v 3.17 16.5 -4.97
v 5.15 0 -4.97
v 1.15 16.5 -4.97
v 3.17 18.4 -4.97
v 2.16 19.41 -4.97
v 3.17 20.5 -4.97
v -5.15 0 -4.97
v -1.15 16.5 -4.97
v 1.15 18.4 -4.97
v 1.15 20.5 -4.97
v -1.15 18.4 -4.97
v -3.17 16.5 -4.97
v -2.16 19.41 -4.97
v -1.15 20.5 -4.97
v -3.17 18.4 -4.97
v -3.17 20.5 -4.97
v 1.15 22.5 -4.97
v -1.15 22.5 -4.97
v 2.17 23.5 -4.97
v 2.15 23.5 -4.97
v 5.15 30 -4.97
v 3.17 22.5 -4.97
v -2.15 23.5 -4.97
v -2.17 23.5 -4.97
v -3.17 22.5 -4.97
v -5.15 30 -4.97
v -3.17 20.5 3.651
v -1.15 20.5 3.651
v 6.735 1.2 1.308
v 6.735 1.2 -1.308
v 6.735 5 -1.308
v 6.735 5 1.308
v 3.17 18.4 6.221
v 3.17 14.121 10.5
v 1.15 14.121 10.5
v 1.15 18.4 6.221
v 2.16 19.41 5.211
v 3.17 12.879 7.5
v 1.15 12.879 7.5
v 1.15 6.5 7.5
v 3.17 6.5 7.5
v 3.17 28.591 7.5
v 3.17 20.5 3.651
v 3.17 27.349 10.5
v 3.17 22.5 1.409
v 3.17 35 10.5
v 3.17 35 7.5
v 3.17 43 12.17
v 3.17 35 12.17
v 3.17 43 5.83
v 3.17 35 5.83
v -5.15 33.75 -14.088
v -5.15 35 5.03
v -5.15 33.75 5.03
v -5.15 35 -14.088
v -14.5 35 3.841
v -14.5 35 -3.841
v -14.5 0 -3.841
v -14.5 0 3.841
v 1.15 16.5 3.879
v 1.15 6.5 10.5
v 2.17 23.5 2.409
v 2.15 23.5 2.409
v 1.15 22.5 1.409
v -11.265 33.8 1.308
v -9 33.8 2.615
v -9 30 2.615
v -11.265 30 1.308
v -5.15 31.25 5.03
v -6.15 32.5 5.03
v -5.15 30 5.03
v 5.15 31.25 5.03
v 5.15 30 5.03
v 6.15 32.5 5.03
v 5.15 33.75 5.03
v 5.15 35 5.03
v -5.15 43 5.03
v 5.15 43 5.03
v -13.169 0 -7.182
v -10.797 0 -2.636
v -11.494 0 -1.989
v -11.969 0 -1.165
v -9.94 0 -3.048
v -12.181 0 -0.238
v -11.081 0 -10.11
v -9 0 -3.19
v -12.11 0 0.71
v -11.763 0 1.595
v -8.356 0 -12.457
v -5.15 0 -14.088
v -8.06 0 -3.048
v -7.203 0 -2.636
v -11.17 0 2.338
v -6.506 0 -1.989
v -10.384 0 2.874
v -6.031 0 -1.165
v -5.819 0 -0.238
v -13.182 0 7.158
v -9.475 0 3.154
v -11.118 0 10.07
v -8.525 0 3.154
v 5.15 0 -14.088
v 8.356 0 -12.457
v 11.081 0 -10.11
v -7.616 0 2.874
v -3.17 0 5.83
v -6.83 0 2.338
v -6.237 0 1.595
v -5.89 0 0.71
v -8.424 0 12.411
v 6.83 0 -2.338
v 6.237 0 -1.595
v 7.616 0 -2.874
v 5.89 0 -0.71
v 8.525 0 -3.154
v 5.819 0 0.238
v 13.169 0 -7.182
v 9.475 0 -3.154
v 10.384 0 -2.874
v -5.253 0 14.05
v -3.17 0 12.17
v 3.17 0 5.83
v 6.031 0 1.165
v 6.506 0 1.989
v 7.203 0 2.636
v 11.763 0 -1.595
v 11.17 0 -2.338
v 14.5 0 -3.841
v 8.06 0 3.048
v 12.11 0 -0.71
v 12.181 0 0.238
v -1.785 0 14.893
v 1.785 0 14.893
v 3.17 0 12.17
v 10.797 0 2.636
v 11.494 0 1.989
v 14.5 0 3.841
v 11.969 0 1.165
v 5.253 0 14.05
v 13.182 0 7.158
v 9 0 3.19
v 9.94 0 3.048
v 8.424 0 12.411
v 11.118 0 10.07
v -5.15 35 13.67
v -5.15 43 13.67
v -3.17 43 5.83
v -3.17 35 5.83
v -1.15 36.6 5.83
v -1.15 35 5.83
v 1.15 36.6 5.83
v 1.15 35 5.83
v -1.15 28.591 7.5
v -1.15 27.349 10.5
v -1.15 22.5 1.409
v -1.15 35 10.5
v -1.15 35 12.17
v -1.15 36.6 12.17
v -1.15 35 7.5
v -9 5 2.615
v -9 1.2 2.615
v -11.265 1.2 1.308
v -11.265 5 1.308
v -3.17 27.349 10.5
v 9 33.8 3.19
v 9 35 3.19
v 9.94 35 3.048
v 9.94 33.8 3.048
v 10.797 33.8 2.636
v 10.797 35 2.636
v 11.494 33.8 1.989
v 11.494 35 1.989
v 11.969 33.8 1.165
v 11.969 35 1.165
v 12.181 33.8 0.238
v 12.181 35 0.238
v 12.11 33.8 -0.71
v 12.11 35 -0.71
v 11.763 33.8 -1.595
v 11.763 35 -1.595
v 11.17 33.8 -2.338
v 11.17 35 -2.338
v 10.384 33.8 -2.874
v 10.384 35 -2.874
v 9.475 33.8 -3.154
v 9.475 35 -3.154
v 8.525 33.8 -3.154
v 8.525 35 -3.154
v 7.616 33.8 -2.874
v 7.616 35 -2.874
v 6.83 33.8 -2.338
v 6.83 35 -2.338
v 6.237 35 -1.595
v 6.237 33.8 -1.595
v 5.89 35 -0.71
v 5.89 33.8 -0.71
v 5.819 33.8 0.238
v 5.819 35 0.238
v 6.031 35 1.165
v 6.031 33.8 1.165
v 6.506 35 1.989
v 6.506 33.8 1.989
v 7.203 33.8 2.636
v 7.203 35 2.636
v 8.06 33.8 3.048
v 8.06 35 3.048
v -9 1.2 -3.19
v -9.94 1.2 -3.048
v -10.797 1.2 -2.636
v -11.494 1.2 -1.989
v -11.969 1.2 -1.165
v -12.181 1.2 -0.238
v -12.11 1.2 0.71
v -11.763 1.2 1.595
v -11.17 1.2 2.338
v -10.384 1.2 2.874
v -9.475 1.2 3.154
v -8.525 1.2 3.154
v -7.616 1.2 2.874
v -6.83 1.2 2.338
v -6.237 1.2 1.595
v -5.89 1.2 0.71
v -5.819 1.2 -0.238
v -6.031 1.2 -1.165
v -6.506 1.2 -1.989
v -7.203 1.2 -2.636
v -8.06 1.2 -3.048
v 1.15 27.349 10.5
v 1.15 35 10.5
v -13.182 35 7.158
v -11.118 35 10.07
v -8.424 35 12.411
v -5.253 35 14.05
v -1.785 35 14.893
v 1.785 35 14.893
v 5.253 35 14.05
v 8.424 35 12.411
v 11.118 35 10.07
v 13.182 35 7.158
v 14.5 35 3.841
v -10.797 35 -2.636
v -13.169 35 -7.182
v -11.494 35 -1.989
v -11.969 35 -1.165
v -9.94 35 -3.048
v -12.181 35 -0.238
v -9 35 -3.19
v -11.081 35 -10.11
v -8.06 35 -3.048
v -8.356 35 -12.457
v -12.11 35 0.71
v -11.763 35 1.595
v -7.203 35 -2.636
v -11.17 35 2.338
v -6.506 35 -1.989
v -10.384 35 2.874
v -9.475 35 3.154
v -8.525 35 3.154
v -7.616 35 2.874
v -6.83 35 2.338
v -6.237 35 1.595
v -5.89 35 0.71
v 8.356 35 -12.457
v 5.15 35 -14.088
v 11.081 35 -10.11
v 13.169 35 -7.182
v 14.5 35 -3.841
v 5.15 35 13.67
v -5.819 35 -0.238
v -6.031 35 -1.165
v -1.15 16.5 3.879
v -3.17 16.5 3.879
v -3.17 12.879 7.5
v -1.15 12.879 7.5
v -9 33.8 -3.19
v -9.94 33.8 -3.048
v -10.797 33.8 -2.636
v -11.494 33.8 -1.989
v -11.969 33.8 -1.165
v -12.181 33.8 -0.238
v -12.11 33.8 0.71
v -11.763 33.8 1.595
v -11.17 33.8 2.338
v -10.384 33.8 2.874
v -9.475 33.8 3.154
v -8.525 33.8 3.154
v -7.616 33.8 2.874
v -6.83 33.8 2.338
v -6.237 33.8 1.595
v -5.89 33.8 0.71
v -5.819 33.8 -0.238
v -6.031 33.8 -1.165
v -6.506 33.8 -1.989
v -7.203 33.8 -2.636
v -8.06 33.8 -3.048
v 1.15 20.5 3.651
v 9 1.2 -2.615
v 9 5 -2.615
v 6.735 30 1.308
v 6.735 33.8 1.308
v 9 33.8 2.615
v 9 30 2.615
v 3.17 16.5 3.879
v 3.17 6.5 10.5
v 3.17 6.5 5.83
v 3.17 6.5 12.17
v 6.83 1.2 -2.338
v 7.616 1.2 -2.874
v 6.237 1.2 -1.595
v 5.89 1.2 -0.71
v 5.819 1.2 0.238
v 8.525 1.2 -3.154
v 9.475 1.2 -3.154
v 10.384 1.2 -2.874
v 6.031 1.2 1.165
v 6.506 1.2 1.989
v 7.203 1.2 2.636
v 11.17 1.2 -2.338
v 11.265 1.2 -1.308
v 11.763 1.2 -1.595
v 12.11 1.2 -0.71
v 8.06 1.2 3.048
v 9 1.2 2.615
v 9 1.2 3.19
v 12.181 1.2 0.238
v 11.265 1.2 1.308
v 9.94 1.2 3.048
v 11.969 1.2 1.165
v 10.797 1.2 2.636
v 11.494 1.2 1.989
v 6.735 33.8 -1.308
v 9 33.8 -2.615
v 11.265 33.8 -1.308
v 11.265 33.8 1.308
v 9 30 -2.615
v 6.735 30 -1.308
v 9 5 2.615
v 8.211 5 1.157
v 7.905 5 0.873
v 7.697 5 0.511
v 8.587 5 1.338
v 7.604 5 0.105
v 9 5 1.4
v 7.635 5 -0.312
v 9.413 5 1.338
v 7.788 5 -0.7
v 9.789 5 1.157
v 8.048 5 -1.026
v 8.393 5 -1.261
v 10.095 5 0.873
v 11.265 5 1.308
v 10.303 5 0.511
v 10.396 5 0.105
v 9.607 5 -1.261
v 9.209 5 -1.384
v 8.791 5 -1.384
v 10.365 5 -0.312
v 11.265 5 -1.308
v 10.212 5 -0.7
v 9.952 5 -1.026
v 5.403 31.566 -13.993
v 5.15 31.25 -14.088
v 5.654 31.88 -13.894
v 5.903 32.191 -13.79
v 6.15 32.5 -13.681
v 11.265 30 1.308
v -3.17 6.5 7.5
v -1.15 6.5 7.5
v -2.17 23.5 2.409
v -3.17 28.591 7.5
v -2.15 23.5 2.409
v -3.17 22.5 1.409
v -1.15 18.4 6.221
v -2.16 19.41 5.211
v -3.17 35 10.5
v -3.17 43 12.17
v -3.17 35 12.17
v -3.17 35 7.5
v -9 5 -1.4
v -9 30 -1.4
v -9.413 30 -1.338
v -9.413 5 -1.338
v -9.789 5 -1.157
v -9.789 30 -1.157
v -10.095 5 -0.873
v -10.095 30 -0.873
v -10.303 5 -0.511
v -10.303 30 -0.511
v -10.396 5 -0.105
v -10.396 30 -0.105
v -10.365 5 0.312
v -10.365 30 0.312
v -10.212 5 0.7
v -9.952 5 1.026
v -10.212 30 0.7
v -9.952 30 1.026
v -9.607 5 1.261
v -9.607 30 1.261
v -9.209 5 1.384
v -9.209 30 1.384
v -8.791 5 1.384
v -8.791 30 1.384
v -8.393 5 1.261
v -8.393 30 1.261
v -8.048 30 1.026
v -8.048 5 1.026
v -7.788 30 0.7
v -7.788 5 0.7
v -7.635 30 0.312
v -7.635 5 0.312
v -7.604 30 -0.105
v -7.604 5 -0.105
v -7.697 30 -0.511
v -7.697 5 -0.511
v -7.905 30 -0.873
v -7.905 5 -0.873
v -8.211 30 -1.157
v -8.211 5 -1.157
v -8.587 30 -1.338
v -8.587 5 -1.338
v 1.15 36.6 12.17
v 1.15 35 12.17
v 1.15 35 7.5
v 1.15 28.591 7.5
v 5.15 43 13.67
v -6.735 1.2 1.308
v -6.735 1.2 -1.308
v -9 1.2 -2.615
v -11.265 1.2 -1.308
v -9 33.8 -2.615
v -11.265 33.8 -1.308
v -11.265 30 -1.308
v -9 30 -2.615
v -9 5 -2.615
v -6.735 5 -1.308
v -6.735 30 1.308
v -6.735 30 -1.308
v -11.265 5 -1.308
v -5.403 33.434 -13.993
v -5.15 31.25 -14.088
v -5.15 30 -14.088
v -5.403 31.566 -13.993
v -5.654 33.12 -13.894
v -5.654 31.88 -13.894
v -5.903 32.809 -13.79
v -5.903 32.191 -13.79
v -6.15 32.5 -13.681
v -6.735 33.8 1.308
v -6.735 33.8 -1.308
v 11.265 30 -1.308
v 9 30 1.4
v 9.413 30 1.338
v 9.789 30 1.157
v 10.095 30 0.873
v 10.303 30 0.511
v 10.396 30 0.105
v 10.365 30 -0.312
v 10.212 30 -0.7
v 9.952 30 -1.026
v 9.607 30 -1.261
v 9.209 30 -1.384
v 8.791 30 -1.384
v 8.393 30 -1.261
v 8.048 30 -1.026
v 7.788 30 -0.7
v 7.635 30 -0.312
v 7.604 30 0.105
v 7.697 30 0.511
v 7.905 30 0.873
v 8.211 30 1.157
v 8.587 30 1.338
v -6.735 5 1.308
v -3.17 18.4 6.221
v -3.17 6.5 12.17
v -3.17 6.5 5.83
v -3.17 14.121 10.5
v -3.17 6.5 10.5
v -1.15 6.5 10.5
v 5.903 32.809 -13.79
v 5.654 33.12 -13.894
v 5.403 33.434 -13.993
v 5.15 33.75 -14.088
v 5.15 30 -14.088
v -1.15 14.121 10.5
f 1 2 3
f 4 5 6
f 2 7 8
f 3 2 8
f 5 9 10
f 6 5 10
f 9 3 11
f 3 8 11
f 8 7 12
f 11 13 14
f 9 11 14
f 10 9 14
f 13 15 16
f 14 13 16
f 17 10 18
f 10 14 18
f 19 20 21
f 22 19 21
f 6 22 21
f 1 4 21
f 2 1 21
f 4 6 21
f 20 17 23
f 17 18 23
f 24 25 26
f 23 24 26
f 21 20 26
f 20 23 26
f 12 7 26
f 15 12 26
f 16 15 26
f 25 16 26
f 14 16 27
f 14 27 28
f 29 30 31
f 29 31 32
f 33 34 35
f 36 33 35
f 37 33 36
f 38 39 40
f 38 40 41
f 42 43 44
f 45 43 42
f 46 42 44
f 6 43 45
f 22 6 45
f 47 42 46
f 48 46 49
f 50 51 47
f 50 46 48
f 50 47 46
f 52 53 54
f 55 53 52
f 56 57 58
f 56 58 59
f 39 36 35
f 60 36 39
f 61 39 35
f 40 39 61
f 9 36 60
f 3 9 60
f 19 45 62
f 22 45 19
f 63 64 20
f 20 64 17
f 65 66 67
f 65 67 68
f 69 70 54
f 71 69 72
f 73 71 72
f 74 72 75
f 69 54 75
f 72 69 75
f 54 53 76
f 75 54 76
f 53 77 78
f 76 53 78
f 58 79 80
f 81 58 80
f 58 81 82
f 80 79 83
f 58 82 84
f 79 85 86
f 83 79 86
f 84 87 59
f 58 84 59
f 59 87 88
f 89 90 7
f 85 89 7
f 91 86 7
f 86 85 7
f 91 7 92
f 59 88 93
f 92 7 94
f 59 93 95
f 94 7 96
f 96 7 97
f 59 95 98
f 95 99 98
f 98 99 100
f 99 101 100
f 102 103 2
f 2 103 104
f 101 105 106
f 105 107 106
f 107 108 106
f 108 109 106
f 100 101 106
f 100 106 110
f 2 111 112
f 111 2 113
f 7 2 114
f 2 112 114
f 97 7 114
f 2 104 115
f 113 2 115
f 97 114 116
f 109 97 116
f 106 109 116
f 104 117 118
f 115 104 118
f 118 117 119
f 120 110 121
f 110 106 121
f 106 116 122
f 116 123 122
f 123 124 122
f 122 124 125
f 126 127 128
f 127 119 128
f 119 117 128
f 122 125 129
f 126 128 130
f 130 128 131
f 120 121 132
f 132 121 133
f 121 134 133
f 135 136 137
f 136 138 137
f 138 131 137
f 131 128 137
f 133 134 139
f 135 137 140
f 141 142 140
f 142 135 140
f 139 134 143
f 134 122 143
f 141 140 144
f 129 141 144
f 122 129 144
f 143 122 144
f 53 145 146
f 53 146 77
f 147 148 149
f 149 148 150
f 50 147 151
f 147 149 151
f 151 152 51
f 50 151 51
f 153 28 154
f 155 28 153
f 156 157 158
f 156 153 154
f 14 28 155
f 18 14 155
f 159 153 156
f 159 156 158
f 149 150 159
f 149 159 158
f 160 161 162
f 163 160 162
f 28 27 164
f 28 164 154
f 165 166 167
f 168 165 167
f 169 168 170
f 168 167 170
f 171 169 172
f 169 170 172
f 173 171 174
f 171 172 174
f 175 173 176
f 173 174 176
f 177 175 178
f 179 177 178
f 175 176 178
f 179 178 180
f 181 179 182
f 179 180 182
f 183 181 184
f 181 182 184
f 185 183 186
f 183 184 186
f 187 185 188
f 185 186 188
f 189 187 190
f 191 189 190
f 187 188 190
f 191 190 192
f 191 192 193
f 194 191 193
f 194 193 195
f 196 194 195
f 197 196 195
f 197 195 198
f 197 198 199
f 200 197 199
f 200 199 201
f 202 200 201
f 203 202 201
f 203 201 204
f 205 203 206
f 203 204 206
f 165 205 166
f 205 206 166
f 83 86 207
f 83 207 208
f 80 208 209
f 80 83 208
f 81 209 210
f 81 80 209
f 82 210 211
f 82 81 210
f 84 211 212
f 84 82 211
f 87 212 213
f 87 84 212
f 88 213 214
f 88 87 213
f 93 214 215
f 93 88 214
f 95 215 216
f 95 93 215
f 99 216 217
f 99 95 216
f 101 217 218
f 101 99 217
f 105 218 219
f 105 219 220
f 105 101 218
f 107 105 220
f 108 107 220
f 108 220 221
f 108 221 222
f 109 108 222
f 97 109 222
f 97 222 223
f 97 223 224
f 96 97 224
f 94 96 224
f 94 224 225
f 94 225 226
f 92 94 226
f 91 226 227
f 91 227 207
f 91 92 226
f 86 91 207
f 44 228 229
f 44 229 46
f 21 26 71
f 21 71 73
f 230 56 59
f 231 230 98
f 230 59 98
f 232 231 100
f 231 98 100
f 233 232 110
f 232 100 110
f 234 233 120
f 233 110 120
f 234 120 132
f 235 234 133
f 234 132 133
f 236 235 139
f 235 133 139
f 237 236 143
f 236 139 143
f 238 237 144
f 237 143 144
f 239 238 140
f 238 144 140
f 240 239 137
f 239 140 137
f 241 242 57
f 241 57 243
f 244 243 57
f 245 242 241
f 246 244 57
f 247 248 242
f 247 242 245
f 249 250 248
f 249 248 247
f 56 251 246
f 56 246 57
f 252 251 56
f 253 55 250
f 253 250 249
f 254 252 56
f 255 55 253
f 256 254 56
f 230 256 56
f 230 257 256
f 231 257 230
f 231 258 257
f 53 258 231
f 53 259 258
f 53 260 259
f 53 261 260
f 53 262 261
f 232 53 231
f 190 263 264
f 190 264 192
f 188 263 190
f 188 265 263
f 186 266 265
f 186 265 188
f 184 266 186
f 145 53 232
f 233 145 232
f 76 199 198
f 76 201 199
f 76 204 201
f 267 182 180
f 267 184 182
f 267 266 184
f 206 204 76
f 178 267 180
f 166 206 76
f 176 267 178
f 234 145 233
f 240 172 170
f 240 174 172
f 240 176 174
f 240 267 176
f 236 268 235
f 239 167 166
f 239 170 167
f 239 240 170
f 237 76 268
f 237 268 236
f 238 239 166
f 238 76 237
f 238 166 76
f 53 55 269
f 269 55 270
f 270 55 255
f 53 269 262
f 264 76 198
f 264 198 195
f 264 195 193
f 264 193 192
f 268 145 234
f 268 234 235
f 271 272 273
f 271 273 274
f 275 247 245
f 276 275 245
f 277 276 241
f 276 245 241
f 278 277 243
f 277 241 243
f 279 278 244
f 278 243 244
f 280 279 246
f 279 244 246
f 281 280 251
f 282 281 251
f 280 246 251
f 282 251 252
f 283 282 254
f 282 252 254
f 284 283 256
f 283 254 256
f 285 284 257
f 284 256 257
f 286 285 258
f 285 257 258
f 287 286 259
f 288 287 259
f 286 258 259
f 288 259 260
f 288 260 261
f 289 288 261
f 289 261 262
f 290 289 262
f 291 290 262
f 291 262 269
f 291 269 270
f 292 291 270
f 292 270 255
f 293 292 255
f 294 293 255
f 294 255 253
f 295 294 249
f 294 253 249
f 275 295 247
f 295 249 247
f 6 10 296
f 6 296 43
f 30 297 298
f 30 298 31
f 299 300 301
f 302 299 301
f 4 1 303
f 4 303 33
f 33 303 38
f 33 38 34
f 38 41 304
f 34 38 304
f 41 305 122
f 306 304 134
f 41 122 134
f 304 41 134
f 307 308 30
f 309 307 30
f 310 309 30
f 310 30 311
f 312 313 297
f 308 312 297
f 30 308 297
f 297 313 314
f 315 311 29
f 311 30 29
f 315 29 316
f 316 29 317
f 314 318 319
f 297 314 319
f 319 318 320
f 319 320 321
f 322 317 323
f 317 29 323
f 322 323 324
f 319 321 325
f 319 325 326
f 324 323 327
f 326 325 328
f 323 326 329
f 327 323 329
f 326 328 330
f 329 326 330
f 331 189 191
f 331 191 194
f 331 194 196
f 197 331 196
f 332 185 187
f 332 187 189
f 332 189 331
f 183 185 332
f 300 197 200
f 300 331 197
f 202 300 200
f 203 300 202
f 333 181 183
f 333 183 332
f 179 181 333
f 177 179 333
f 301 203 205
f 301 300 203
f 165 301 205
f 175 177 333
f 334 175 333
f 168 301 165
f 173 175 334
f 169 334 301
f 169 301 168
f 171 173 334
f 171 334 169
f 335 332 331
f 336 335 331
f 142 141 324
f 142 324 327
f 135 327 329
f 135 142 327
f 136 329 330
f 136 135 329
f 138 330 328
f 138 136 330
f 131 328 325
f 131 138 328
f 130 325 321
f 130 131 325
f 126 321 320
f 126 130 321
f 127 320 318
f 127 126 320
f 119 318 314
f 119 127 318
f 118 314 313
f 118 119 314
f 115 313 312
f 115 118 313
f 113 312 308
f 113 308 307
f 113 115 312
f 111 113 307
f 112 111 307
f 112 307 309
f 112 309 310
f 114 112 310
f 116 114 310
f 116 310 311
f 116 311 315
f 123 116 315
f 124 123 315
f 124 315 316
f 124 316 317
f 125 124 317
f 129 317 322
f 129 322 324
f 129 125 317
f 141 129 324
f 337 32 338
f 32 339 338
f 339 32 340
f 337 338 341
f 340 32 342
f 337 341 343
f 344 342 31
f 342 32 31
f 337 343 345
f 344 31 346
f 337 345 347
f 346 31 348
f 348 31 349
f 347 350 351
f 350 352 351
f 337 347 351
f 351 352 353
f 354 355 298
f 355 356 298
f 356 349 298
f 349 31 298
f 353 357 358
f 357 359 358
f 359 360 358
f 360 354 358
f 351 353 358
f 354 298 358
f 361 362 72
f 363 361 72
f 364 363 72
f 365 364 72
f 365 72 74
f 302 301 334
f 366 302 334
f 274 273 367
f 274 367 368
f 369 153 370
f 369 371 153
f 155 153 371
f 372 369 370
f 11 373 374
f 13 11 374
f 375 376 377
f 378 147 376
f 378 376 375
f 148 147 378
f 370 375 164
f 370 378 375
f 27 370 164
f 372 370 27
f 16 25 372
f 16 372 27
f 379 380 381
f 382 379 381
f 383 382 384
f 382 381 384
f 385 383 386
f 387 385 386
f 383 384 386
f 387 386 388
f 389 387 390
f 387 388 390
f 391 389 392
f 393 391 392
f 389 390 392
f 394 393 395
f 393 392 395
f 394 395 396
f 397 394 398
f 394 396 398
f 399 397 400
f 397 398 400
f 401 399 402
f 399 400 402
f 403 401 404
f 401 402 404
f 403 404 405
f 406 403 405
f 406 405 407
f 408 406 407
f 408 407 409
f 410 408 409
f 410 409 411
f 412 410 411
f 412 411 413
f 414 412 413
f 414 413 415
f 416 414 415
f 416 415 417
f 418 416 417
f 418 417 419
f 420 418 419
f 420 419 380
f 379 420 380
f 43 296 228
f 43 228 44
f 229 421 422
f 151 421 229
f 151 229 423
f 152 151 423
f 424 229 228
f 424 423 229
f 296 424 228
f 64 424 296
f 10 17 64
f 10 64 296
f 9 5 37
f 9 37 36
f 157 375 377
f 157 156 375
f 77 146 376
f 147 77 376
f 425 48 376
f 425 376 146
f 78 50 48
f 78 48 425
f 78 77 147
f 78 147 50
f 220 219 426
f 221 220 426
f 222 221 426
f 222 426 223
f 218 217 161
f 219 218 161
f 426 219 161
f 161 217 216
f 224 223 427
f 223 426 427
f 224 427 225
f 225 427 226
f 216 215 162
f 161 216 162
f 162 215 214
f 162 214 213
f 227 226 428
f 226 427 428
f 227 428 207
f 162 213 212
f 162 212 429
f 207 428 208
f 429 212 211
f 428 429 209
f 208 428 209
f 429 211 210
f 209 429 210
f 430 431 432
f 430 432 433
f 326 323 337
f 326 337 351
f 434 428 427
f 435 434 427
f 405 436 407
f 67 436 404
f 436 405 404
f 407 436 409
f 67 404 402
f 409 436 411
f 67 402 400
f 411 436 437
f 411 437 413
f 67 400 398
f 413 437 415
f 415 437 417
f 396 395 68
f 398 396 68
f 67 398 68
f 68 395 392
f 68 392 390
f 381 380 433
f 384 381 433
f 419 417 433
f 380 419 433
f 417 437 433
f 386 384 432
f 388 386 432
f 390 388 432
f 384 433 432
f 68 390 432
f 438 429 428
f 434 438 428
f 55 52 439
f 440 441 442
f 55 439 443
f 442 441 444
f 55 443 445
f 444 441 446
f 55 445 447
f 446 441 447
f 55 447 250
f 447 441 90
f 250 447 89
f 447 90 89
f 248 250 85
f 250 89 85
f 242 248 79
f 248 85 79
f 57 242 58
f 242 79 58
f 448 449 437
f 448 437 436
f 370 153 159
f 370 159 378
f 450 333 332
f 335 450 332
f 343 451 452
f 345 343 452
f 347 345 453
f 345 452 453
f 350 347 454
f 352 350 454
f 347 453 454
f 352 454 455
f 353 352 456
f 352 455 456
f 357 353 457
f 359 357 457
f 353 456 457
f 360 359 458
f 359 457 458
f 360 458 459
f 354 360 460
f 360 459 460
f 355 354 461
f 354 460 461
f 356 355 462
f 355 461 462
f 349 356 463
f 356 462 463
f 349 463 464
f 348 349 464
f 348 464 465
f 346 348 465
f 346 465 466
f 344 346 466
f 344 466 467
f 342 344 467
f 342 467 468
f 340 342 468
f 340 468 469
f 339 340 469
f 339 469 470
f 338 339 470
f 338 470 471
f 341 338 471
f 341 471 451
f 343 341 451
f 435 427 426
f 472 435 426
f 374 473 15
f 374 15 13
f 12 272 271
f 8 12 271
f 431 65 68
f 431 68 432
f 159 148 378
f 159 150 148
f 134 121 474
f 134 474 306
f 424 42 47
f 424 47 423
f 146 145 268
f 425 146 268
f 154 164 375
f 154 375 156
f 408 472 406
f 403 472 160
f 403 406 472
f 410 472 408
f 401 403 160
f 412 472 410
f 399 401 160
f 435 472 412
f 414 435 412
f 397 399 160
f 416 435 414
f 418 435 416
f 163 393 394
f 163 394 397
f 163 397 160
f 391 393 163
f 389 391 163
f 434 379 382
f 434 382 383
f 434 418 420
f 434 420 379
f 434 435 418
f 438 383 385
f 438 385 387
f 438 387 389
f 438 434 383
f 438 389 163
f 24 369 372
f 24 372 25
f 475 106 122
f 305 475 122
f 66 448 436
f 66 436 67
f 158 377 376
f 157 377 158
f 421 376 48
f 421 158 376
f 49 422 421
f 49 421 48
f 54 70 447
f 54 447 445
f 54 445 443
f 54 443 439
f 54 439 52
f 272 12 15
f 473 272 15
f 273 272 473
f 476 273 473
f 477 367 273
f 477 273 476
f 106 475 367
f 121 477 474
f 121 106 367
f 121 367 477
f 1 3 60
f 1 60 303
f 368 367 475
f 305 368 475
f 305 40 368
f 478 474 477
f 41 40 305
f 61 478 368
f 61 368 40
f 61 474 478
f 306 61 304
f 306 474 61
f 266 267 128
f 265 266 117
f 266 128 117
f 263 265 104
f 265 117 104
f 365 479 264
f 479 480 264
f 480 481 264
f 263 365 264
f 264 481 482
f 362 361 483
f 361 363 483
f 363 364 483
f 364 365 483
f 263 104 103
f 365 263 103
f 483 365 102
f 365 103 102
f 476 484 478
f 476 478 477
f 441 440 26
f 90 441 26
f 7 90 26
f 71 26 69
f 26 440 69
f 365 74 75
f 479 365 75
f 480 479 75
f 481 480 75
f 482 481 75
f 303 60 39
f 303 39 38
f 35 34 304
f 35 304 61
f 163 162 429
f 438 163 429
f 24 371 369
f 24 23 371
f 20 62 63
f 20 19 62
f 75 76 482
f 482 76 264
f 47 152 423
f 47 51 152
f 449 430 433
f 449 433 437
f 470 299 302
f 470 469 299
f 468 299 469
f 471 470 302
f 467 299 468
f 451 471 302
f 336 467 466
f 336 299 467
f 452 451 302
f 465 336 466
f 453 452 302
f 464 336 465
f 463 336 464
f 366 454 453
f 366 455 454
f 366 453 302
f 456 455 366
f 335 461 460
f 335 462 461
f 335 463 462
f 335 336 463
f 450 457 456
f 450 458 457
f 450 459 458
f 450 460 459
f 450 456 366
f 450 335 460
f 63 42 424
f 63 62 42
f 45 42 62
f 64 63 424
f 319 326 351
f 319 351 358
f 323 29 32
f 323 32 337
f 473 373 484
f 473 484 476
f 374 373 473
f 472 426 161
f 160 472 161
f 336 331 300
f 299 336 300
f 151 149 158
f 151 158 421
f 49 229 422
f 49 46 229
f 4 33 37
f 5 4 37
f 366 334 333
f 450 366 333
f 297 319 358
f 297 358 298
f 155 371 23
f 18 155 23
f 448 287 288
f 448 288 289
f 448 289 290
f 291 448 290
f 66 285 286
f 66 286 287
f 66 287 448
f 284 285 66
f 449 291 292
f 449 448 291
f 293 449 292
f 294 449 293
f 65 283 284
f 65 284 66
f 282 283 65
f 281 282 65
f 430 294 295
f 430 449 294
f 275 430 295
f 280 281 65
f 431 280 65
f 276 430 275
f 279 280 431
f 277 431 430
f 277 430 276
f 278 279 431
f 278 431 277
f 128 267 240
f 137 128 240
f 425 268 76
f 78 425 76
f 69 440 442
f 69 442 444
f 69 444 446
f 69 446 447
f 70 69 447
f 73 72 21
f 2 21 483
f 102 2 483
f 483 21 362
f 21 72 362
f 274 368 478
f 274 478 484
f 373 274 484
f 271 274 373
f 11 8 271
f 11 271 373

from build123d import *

# Parameters (mm, degrees)
SKETCH_1_R          = 15
EXTRUDE_1_DEPTH     = 35
SKETCH_2_R          = 1.4
CUT_EXTRUDE_1_DEPTH = 41.926763859
SKETCH_4_W          = 10.3
SKETCH_4_H          = 8.64
SKETCH_4_W_2        = 6.34
SKETCH_4_H_2        = 6.34
EXTRUDE_2_DEPTH     = 8
SKETCH_5_W          = 10.3
SKETCH_5_H          = 20.03
CUT_EXTRUDE_2_DEPTH = 5
CUT_EXTRUDE_3_DEPTH = 50.751390935
CUT_EXTRUDE_4_DEPTH = 37.742346142
SKETCH_8_W          = 2.3
SKETCH_8_H          = 6.34
EXTRUDE_3_DEPTH     = 1.6
SKETCH_10_W         = 2.02
SKETCH_10_H         = 3
SKETCH_11_W         = 6.34
SKETCH_11_H         = 6.34
CUT_EXTRUDE_5_DEPTH = 6.5
SKETCH_12_W         = 2.02
SKETCH_12_H         = 3
CUT_EXTRUDE_7_DEPTH = 5
SKETCH_16_R         = 3.19
CUT_EXTRUDE_8_DEPTH = 1.2
CUT_EXTRUDE_9_DEPTH = 41.926763859
CHAMFER_1_SIZE      = 1.1
CHAMFER_2_SIZE      = 1


with BuildPart() as part:
    # 草图1 → 凸台-拉伸1 (new body)
    with BuildSketch(Plane(origin=(0, 0, 0), x_dir=(1, 0, 0), z_dir=(0, 1, 0))):
        with Locations(Location((0, 0, 0), (0, 0, 270))):
            Circle(SKETCH_1_R)
    extrude(amount=EXTRUDE_1_DEPTH)

    # 草图2 → 切除-拉伸1 (cut, through all)
    with BuildSketch(Plane(origin=(0, 35, 0), x_dir=(1, 0, 0), z_dir=(0, 1, 0))):
        with Locations(Location((9, 0, 0), (0, 0, 270))):
            Circle(SKETCH_2_R)
        with Locations(Location((-9, 0, 0), (0, 0, 90))):
            Circle(SKETCH_2_R)
    extrude(amount=-CUT_EXTRUDE_1_DEPTH, mode=Mode.SUBTRACT)

    # 草图4 → 凸台-拉伸2 (add)
    with BuildSketch(Plane(origin=(0, 35, 0), x_dir=(1, 0, 0), z_dir=(0, 1, 0))):
        with Locations((0, -9.35)):
            Rectangle(SKETCH_4_W, SKETCH_4_H)
        with Locations((0, -9)):
            Rectangle(SKETCH_4_W_2, SKETCH_4_H_2, mode=Mode.SUBTRACT)
    extrude(amount=EXTRUDE_2_DEPTH)

    # 草图5 → 切除-拉伸2 (cut)
    with BuildSketch(Plane(origin=(0, 35, 0), x_dir=(1, 0, 0), z_dir=(0, 1, 0))):
        with Locations((0, 4.985)):
            Rectangle(SKETCH_5_W, SKETCH_5_H)
    extrude(amount=-CUT_EXTRUDE_2_DEPTH, mode=Mode.SUBTRACT)

    # 草图6 → 切除-拉伸3 (cut, through all)
    with BuildSketch(Plane(origin=(0, 0, 5.03), x_dir=(-1, 0, 0), z_dir=(0, 0, -1))):
        Polygon((-6.15, 32.5), (-5.15, 33.75), (-5.15, 31.25), align=None)
        Polygon((6.15, 32.5), (5.15, 33.75), (5.15, 31.25), align=None)
    extrude(amount=CUT_EXTRUDE_3_DEPTH, mode=Mode.SUBTRACT)

    # 草图7 → 切除-拉伸4 (cut, through all)
    with BuildSketch(Plane(origin=(0, 30, 0), x_dir=(1, 0, 0), z_dir=(0, 1, 0))):
        with BuildLine():
            Line((-5.15, 14.088204286), (-5.15, 4.97))
            Line((-5.15, 4.97), (5.15, 4.97))
            Line((5.15, 4.97), (5.15, 14.088204286))
            ThreePointArc((5.15, 14.088204286), (0, 15), (-5.15, 14.088204286))
        make_face()
    extrude(amount=-CUT_EXTRUDE_4_DEPTH, mode=Mode.SUBTRACT)

    # 草图8 → 凸台-拉伸3 (add)
    with BuildSketch(Plane(origin=(0, 35, 0), x_dir=(1, 0, 0), z_dir=(0, 1, 0))):
        with Locations((0, -9)):
            Rectangle(SKETCH_8_W, SKETCH_8_H)
    extrude(amount=EXTRUDE_3_DEPTH)

    # 切除-扫描1: sweep along a path in 草图9
    with BuildLine(Plane(origin=(0, 0, 0), x_dir=(0, 0, -1), z_dir=(1, 0, 0))) as sweep_1_path:
        Line((-9, 35), (-9, 27.97))
        Line((-9, 27.97), (-3.03, 22))
        Line((-3.03, 22), (4.97, 22))
    # 草图10 → 切除-扫描1 (sweep, cut)
    with BuildSketch(Plane(origin=(0, 35, 0), x_dir=(1, 0, 0), z_dir=(0, 1, 0))):
        with Locations((2.16, -9)):
            Rectangle(SKETCH_10_W, SKETCH_10_H)
        with Locations((-2.16, -9)):
            Rectangle(SKETCH_10_W, SKETCH_10_H)
    sweep(path=sweep_1_path.line, transition=Transition.RIGHT, mode=Mode.SUBTRACT)

    # 草图11 → 切除-拉伸5 (cut)
    with BuildSketch(Plane.XZ):
        with Locations((0, 9)):
            Rectangle(SKETCH_11_W, SKETCH_11_H)
    extrude(amount=-CUT_EXTRUDE_5_DEPTH, mode=Mode.SUBTRACT)

    # 切除-扫描2: sweep along a path in 草图13
    with BuildLine(Plane(origin=(0, 0, 0), x_dir=(0, 0, -1), z_dir=(1, 0, 0))) as sweep_2_path:
        Line((-9, 6.5), (-9, 13.5))
        Line((-9, 13.5), (-4.5, 18))
        Line((-4.5, 18), (4.97, 18))
    # 草图12 → 切除-扫描2 (sweep, cut)
    with BuildSketch(Plane.XZ.offset(-6.5)):
        with Locations((-2.16, 9)):
            Rectangle(SKETCH_12_W, SKETCH_12_H)
        with Locations((2.16, 9)):
            Rectangle(SKETCH_12_W, SKETCH_12_H)
    sweep(path=sweep_2_path.line, transition=Transition.RIGHT, mode=Mode.SUBTRACT)

    # 草图15 → 切除-拉伸7 (cut)
    with BuildSketch(Plane(origin=(0, 35, 0), x_dir=(1, 0, 0), z_dir=(0, 1, 0))):
        Polygon((9, 2.615396719), (6.735, 1.30769836), (6.735, -1.30769836), (9, -2.615396719), (11.265, -1.30769836), (11.265, 1.30769836), align=None)
        Polygon((-11.265, -1.30769836), (-11.265, 1.30769836), (-9, 2.615396719), (-6.735, 1.30769836), (-6.735, -1.30769836), (-9, -2.615396719), align=None)
    cut_extrude_7 = extrude(amount=-CUT_EXTRUDE_7_DEPTH, mode=Mode.SUBTRACT)

    # 草图16 → 切除-拉伸8 (cut)
    with BuildSketch(Plane(origin=(0, 35, 0), x_dir=(1, 0, 0), z_dir=(0, 1, 0))):
        with Locations(Location((9, 0, 0), (0, 0, 270))):
            Circle(SKETCH_16_R)
        with Locations(Location((-9, 0, 0), (0, 0, 90))):
            Circle(SKETCH_16_R)
    cut_extrude_8 = extrude(amount=-CUT_EXTRUDE_8_DEPTH, mode=Mode.SUBTRACT)

    # 镜向1: 切除-拉伸7, 切除-拉伸8 across plane
    add(cut_extrude_7.mirror(Plane.ZX.offset(17.5)), mode=Mode.SUBTRACT)
    add(cut_extrude_8.mirror(Plane.ZX.offset(17.5)), mode=Mode.SUBTRACT)

    # 草图17 → 切除-拉伸9 (cut, through all)
    with BuildSketch(Plane(origin=(0, 35, 0), x_dir=(1, 0, 0), z_dir=(0, 1, 0))):
        with BuildLine():
            Line((14.5, 3.840572874), (14.5, -3.840572874))
            ThreePointArc((14.5, -3.840572874), (15, 0), (14.5, 3.840572874))
        make_face()
        with BuildLine():
            Line((-14.5, 3.840572874), (-14.5, -3.840572874))
            ThreePointArc((-14.5, -3.840572874), (-15, 0), (-14.5, 3.840572874))
        make_face()
    extrude(amount=-CUT_EXTRUDE_9_DEPTH, mode=Mode.SUBTRACT)

    # 倒角1
    # the kernel refuses this chamfer: 1.1 mm, written as the material it adds along each edge
    with BuildSketch(Plane(origin=(-3.17, 19.5, 7.95017163), x_dir=(-0.027495876610586133, -0.9996219169112966, 0), z_dir=(0, 0, -1))) as chamfer_1_piece_1:
        Polygon((CHAMFER_1_SIZE * 0.999621916911, -CHAMFER_1_SIZE * 0.0274958766106), (-CHAMFER_1_SIZE * 0.0274958766106, -CHAMFER_1_SIZE * 0.999621916911), (0, 0), align=None)
    extrude(amount=12.92017163)
    with BuildSketch(Plane(origin=(-1.15, 19.5, 7.95017163), x_dir=(0.02749587661058633, -0.9996219169112966, 0), z_dir=(0, 0, -1)), Plane(origin=(3.17, 19.5, 7.95017163), x_dir=(0.027495876610586525, -0.9996219169112966, 0), z_dir=(0, 0, -1)), Plane(origin=(1.15, 19.5, 7.95017163), x_dir=(0.9996219169112966, 0.02749587661058971, 0), z_dir=(0, 0, -1))) as chamfer_1_piece_2:
        Polygon((CHAMFER_1_SIZE * 0.999621916911, CHAMFER_1_SIZE * 0.0274958766106), (-CHAMFER_1_SIZE * 0.0274958766106, CHAMFER_1_SIZE * 0.999621916911), (0, 0), align=None)
    extrude(amount=12.92017163)

    # 倒角2
    chamfer_2_edges = [part.edges().sort_by_distance(p)[0] for p in [
        (3.17, 23.5, -1.280660172),
        (1.15, 23.5, -1.280660172),
        (-1.15, 23.5, -1.280660172),
        (-3.17, 23.5, -1.280660172),
    ]]
    chamfer(chamfer_2_edges, length=CHAMFER_2_SIZE)


solid = part.part
